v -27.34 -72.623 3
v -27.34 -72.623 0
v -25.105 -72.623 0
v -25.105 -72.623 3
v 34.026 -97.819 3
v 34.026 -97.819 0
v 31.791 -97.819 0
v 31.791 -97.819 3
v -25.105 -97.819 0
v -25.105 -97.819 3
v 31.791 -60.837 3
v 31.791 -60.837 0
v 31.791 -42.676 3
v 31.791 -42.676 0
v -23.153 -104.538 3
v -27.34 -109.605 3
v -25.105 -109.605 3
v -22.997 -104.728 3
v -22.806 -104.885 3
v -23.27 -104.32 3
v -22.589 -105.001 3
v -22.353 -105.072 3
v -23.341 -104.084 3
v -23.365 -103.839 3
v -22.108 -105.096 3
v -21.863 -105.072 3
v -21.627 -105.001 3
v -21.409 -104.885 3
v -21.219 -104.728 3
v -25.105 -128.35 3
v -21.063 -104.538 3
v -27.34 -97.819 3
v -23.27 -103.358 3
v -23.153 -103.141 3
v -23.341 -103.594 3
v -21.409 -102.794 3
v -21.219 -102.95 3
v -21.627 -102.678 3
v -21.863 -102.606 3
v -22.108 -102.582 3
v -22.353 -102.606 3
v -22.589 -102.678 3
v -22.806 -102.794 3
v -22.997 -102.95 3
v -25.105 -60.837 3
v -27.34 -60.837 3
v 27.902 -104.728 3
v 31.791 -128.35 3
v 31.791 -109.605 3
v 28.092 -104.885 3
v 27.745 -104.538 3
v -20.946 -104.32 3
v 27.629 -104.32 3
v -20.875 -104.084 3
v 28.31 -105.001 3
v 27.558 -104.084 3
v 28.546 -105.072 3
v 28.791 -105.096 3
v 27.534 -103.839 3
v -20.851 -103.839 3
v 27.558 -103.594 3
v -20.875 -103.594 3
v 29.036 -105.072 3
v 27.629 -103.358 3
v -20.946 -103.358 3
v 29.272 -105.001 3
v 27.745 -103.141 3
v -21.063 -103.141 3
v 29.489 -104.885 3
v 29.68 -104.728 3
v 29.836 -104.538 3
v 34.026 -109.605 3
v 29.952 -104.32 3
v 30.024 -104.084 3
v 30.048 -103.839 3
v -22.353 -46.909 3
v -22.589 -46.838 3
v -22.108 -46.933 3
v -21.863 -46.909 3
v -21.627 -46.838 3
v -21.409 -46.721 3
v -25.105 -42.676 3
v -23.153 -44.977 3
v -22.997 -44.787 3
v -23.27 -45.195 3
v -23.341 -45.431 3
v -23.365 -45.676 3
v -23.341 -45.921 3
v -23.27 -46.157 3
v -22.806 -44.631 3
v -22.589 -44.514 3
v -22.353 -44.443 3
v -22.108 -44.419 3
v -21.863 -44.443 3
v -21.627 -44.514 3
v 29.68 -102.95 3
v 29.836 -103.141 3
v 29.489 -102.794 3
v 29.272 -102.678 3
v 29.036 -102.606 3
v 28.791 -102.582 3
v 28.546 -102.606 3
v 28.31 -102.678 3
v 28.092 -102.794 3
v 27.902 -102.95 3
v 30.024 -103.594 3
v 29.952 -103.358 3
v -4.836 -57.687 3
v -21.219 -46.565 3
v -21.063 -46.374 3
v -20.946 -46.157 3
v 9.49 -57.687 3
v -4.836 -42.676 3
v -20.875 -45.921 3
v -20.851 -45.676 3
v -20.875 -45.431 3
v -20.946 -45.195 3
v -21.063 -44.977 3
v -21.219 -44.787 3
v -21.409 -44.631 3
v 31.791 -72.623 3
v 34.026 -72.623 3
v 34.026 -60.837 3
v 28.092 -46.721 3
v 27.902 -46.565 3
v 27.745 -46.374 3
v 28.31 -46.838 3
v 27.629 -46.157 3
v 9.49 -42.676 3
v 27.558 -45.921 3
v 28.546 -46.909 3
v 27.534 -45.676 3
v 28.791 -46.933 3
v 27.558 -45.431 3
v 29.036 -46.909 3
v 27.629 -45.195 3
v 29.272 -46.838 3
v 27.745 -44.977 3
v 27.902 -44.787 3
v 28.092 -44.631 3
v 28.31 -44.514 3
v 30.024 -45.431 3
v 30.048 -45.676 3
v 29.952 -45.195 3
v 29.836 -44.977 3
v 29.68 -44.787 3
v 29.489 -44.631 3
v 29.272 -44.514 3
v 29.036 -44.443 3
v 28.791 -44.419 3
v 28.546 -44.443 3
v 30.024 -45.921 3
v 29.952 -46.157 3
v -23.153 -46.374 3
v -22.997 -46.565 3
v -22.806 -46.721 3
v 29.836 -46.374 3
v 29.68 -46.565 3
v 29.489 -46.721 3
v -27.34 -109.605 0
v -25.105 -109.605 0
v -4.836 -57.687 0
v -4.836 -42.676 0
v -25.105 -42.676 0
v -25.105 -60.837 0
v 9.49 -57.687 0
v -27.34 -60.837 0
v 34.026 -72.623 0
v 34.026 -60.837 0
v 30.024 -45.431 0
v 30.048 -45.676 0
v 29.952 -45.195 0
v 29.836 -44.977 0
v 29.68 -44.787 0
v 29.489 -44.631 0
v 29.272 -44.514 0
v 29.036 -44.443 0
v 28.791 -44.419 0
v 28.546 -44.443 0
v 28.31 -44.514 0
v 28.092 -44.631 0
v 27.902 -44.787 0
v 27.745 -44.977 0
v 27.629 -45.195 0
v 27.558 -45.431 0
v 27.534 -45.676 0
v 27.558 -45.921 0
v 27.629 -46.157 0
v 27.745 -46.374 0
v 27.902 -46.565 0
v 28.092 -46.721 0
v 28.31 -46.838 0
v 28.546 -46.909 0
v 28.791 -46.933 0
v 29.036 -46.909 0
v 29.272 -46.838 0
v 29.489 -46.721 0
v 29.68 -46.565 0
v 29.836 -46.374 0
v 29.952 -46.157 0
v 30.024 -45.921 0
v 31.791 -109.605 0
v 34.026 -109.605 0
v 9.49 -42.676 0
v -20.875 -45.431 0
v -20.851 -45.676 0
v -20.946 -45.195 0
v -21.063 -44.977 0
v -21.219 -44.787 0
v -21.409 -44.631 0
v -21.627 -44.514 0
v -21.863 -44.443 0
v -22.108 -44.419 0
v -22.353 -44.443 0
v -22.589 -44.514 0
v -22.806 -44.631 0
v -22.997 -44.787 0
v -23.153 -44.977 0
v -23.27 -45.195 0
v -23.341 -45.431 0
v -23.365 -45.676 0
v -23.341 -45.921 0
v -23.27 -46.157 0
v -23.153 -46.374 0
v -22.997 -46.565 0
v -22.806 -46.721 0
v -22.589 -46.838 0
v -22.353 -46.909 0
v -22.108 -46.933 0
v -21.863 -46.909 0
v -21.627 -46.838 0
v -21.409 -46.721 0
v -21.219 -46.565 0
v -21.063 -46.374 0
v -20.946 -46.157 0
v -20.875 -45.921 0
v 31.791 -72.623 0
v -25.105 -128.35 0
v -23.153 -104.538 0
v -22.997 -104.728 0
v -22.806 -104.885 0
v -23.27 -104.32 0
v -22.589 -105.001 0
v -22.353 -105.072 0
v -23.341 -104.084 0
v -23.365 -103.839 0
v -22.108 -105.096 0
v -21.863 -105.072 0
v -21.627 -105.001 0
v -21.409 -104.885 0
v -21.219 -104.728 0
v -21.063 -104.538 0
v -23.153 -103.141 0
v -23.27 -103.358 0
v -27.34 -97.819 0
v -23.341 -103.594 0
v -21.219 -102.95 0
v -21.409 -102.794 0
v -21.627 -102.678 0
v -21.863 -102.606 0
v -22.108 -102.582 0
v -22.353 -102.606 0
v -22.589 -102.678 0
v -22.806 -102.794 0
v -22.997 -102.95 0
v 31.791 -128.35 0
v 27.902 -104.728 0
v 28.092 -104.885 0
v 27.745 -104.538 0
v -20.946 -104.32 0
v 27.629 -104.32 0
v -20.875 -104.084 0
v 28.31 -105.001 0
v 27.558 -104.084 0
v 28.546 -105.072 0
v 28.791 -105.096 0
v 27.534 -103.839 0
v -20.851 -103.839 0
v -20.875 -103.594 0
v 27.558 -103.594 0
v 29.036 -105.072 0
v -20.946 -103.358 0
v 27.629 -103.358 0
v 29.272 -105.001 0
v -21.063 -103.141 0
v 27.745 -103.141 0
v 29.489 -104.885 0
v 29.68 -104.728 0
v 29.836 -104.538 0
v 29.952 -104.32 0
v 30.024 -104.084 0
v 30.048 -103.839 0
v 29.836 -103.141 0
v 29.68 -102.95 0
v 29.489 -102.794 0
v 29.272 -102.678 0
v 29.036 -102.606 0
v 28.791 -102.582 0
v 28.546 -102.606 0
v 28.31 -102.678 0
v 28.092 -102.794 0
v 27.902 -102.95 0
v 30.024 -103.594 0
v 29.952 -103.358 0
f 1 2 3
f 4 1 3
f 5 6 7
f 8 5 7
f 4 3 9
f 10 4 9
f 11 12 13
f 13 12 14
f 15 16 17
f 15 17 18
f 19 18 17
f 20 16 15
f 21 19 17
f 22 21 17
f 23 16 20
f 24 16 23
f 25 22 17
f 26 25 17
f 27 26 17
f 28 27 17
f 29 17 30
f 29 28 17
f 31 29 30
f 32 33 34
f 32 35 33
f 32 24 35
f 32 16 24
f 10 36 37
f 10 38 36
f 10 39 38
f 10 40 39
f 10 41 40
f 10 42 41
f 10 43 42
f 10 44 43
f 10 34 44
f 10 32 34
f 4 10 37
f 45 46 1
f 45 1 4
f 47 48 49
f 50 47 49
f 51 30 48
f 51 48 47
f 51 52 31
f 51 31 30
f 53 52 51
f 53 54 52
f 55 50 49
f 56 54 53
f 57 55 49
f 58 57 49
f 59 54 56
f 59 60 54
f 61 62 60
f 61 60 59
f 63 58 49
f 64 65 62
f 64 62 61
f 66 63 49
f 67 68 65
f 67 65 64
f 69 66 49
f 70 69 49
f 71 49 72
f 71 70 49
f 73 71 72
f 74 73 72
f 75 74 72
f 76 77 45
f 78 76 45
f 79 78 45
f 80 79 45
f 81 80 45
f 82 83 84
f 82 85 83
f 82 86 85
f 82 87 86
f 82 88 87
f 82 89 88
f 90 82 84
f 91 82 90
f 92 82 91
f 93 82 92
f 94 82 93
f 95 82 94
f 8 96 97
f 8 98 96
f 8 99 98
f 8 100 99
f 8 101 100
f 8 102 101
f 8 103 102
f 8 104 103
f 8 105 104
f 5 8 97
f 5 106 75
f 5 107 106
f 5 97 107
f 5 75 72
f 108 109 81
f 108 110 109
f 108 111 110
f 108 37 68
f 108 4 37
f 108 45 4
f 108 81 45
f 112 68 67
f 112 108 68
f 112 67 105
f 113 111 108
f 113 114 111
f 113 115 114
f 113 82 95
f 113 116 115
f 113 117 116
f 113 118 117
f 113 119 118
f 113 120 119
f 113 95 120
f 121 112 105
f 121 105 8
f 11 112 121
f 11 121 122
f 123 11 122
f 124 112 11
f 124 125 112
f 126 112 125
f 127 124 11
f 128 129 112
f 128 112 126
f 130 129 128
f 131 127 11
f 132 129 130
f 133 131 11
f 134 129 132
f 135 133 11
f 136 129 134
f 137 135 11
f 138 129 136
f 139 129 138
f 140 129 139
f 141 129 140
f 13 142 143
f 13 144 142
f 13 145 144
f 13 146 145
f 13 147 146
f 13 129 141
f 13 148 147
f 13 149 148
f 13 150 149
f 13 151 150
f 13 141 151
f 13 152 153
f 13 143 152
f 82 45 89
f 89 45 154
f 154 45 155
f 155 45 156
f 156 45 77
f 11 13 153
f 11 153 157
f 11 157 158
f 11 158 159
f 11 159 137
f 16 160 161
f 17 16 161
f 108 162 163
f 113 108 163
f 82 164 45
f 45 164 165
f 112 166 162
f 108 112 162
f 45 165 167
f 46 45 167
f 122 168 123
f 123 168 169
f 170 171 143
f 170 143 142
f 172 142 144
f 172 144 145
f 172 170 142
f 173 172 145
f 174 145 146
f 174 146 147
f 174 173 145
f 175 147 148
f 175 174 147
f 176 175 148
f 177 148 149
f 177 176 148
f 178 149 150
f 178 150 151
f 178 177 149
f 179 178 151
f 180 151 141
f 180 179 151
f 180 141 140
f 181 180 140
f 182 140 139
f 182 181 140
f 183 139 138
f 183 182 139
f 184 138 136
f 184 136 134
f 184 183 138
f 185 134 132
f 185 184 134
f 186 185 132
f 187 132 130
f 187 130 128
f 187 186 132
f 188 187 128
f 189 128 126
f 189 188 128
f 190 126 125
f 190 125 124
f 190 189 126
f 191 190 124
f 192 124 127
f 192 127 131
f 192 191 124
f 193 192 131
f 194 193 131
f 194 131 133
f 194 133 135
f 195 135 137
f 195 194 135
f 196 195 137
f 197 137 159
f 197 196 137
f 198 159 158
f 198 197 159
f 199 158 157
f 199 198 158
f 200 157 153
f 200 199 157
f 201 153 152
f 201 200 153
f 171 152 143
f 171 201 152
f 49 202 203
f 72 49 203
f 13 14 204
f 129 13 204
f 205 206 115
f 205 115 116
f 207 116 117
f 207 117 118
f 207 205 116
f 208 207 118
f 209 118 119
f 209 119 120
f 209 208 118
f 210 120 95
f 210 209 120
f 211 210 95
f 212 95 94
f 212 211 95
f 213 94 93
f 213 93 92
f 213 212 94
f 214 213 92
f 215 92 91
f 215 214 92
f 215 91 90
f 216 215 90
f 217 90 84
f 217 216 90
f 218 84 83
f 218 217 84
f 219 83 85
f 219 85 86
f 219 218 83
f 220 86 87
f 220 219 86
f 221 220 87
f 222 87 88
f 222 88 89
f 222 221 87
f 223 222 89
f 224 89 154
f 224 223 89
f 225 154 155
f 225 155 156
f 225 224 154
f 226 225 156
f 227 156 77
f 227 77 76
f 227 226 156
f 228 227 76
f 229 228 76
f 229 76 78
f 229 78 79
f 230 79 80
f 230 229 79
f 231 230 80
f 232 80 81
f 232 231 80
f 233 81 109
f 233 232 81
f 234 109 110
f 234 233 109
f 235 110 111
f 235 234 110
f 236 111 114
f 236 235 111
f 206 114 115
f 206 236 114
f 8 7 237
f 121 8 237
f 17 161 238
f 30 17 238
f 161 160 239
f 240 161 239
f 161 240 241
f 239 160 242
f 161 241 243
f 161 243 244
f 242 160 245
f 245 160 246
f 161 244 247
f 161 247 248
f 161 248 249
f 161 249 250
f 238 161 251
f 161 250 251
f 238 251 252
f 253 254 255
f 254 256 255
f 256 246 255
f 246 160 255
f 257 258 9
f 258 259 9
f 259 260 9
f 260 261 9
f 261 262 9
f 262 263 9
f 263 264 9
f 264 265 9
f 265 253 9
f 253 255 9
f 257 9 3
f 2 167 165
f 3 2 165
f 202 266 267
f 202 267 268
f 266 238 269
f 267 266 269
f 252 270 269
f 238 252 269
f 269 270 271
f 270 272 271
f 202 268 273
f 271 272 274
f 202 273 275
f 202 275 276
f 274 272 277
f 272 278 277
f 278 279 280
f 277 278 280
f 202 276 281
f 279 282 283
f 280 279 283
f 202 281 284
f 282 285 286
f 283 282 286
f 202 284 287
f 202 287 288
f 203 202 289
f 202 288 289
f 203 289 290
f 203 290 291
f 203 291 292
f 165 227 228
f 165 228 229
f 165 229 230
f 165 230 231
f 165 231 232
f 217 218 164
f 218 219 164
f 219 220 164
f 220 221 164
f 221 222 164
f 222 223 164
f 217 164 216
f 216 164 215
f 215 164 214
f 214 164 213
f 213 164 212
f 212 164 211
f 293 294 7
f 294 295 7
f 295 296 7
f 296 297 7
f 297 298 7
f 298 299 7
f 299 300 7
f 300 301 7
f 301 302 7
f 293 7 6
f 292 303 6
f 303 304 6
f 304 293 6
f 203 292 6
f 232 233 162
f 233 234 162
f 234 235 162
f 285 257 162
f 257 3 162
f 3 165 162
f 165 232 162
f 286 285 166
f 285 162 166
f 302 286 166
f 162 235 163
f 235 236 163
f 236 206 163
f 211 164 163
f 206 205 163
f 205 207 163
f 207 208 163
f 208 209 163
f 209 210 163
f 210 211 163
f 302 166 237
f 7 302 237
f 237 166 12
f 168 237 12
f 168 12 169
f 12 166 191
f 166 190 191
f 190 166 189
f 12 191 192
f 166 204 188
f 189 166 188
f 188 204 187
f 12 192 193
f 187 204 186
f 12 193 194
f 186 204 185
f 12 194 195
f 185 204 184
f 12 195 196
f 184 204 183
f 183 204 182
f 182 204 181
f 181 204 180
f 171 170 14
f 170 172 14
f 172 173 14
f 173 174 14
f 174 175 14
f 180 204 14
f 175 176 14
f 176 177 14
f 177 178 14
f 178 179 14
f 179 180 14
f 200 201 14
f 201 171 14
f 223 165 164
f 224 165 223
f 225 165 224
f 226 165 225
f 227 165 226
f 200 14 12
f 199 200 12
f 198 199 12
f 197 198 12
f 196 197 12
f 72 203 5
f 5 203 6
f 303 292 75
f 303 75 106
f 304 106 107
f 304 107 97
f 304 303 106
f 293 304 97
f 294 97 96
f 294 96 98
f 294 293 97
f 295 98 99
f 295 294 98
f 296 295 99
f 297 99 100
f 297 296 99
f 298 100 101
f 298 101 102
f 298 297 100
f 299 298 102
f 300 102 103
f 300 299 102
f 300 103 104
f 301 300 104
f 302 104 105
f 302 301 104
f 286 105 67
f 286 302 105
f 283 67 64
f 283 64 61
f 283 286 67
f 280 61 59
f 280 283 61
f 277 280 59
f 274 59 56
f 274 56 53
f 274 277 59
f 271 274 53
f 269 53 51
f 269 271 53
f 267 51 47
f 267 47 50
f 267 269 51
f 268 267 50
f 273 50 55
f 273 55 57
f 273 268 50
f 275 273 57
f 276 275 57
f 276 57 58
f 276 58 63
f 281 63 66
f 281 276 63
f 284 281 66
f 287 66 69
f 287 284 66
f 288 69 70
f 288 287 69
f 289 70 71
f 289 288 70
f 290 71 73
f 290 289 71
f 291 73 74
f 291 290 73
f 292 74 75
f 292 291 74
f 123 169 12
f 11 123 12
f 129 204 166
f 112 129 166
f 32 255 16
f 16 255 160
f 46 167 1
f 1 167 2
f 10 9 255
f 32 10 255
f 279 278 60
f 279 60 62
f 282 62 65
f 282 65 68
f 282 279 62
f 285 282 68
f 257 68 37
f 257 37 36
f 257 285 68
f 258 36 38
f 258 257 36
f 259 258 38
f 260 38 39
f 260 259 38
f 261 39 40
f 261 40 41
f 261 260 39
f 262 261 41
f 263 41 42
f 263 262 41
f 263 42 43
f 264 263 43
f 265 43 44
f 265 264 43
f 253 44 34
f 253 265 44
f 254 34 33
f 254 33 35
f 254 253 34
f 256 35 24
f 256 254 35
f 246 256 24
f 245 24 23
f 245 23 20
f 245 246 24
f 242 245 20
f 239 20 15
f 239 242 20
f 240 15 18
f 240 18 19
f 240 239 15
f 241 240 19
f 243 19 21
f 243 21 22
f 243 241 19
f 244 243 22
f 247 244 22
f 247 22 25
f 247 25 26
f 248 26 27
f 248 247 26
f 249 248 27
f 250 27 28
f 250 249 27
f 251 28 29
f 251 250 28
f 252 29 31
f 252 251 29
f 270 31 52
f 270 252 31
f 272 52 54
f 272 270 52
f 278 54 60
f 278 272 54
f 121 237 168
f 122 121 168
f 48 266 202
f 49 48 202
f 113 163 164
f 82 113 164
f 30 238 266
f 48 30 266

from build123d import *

# Parameters (mm, degrees)
F0_R     = 1.2573
F1_DEPTH = 3


with BuildPart() as f1:
    # F0 (on Top) → F1 (new body)
    with BuildSketch(Plane.XY):
        Polygon((-4.835955, -42.675929), (-25.105155, -42.675929), (-25.105155, -60.836929), (-27.340355, -60.836929), (-27.340355, -72.622529), (-25.105155, -72.622529), (-25.105155, -97.819329), (-27.340355, -97.819329), (-27.340355, -109.604929), (-25.105155, -109.604929), (-25.105155, -128.350129), (31.790845, -128.350129), (31.790845, -109.604929), (34.026045, -109.604929), (34.026045, -97.819329), (31.790845, -97.819329), (31.790845, -72.622529), (34.026045, -72.622529), (34.026045, -60.836929), (31.790845, -60.836929), (31.790845, -42.675929), (9.489645, -42.675929), (9.489645, -57.687329), (-4.835955, -57.687329), align=None)
        with Locations((-22.107955, -103.839129)):
            Circle(F0_R, mode=Mode.SUBTRACT)
        with Locations((28.790845, -103.839129)):
            Circle(F0_R, mode=Mode.SUBTRACT)
        with Locations((-22.107955, -45.675929)):
            Circle(F0_R, mode=Mode.SUBTRACT)
        with Locations((28.790845, -45.675929)):
            Circle(F0_R, mode=Mode.SUBTRACT)
    extrude(amount=F1_DEPTH)


solid = f1.part
